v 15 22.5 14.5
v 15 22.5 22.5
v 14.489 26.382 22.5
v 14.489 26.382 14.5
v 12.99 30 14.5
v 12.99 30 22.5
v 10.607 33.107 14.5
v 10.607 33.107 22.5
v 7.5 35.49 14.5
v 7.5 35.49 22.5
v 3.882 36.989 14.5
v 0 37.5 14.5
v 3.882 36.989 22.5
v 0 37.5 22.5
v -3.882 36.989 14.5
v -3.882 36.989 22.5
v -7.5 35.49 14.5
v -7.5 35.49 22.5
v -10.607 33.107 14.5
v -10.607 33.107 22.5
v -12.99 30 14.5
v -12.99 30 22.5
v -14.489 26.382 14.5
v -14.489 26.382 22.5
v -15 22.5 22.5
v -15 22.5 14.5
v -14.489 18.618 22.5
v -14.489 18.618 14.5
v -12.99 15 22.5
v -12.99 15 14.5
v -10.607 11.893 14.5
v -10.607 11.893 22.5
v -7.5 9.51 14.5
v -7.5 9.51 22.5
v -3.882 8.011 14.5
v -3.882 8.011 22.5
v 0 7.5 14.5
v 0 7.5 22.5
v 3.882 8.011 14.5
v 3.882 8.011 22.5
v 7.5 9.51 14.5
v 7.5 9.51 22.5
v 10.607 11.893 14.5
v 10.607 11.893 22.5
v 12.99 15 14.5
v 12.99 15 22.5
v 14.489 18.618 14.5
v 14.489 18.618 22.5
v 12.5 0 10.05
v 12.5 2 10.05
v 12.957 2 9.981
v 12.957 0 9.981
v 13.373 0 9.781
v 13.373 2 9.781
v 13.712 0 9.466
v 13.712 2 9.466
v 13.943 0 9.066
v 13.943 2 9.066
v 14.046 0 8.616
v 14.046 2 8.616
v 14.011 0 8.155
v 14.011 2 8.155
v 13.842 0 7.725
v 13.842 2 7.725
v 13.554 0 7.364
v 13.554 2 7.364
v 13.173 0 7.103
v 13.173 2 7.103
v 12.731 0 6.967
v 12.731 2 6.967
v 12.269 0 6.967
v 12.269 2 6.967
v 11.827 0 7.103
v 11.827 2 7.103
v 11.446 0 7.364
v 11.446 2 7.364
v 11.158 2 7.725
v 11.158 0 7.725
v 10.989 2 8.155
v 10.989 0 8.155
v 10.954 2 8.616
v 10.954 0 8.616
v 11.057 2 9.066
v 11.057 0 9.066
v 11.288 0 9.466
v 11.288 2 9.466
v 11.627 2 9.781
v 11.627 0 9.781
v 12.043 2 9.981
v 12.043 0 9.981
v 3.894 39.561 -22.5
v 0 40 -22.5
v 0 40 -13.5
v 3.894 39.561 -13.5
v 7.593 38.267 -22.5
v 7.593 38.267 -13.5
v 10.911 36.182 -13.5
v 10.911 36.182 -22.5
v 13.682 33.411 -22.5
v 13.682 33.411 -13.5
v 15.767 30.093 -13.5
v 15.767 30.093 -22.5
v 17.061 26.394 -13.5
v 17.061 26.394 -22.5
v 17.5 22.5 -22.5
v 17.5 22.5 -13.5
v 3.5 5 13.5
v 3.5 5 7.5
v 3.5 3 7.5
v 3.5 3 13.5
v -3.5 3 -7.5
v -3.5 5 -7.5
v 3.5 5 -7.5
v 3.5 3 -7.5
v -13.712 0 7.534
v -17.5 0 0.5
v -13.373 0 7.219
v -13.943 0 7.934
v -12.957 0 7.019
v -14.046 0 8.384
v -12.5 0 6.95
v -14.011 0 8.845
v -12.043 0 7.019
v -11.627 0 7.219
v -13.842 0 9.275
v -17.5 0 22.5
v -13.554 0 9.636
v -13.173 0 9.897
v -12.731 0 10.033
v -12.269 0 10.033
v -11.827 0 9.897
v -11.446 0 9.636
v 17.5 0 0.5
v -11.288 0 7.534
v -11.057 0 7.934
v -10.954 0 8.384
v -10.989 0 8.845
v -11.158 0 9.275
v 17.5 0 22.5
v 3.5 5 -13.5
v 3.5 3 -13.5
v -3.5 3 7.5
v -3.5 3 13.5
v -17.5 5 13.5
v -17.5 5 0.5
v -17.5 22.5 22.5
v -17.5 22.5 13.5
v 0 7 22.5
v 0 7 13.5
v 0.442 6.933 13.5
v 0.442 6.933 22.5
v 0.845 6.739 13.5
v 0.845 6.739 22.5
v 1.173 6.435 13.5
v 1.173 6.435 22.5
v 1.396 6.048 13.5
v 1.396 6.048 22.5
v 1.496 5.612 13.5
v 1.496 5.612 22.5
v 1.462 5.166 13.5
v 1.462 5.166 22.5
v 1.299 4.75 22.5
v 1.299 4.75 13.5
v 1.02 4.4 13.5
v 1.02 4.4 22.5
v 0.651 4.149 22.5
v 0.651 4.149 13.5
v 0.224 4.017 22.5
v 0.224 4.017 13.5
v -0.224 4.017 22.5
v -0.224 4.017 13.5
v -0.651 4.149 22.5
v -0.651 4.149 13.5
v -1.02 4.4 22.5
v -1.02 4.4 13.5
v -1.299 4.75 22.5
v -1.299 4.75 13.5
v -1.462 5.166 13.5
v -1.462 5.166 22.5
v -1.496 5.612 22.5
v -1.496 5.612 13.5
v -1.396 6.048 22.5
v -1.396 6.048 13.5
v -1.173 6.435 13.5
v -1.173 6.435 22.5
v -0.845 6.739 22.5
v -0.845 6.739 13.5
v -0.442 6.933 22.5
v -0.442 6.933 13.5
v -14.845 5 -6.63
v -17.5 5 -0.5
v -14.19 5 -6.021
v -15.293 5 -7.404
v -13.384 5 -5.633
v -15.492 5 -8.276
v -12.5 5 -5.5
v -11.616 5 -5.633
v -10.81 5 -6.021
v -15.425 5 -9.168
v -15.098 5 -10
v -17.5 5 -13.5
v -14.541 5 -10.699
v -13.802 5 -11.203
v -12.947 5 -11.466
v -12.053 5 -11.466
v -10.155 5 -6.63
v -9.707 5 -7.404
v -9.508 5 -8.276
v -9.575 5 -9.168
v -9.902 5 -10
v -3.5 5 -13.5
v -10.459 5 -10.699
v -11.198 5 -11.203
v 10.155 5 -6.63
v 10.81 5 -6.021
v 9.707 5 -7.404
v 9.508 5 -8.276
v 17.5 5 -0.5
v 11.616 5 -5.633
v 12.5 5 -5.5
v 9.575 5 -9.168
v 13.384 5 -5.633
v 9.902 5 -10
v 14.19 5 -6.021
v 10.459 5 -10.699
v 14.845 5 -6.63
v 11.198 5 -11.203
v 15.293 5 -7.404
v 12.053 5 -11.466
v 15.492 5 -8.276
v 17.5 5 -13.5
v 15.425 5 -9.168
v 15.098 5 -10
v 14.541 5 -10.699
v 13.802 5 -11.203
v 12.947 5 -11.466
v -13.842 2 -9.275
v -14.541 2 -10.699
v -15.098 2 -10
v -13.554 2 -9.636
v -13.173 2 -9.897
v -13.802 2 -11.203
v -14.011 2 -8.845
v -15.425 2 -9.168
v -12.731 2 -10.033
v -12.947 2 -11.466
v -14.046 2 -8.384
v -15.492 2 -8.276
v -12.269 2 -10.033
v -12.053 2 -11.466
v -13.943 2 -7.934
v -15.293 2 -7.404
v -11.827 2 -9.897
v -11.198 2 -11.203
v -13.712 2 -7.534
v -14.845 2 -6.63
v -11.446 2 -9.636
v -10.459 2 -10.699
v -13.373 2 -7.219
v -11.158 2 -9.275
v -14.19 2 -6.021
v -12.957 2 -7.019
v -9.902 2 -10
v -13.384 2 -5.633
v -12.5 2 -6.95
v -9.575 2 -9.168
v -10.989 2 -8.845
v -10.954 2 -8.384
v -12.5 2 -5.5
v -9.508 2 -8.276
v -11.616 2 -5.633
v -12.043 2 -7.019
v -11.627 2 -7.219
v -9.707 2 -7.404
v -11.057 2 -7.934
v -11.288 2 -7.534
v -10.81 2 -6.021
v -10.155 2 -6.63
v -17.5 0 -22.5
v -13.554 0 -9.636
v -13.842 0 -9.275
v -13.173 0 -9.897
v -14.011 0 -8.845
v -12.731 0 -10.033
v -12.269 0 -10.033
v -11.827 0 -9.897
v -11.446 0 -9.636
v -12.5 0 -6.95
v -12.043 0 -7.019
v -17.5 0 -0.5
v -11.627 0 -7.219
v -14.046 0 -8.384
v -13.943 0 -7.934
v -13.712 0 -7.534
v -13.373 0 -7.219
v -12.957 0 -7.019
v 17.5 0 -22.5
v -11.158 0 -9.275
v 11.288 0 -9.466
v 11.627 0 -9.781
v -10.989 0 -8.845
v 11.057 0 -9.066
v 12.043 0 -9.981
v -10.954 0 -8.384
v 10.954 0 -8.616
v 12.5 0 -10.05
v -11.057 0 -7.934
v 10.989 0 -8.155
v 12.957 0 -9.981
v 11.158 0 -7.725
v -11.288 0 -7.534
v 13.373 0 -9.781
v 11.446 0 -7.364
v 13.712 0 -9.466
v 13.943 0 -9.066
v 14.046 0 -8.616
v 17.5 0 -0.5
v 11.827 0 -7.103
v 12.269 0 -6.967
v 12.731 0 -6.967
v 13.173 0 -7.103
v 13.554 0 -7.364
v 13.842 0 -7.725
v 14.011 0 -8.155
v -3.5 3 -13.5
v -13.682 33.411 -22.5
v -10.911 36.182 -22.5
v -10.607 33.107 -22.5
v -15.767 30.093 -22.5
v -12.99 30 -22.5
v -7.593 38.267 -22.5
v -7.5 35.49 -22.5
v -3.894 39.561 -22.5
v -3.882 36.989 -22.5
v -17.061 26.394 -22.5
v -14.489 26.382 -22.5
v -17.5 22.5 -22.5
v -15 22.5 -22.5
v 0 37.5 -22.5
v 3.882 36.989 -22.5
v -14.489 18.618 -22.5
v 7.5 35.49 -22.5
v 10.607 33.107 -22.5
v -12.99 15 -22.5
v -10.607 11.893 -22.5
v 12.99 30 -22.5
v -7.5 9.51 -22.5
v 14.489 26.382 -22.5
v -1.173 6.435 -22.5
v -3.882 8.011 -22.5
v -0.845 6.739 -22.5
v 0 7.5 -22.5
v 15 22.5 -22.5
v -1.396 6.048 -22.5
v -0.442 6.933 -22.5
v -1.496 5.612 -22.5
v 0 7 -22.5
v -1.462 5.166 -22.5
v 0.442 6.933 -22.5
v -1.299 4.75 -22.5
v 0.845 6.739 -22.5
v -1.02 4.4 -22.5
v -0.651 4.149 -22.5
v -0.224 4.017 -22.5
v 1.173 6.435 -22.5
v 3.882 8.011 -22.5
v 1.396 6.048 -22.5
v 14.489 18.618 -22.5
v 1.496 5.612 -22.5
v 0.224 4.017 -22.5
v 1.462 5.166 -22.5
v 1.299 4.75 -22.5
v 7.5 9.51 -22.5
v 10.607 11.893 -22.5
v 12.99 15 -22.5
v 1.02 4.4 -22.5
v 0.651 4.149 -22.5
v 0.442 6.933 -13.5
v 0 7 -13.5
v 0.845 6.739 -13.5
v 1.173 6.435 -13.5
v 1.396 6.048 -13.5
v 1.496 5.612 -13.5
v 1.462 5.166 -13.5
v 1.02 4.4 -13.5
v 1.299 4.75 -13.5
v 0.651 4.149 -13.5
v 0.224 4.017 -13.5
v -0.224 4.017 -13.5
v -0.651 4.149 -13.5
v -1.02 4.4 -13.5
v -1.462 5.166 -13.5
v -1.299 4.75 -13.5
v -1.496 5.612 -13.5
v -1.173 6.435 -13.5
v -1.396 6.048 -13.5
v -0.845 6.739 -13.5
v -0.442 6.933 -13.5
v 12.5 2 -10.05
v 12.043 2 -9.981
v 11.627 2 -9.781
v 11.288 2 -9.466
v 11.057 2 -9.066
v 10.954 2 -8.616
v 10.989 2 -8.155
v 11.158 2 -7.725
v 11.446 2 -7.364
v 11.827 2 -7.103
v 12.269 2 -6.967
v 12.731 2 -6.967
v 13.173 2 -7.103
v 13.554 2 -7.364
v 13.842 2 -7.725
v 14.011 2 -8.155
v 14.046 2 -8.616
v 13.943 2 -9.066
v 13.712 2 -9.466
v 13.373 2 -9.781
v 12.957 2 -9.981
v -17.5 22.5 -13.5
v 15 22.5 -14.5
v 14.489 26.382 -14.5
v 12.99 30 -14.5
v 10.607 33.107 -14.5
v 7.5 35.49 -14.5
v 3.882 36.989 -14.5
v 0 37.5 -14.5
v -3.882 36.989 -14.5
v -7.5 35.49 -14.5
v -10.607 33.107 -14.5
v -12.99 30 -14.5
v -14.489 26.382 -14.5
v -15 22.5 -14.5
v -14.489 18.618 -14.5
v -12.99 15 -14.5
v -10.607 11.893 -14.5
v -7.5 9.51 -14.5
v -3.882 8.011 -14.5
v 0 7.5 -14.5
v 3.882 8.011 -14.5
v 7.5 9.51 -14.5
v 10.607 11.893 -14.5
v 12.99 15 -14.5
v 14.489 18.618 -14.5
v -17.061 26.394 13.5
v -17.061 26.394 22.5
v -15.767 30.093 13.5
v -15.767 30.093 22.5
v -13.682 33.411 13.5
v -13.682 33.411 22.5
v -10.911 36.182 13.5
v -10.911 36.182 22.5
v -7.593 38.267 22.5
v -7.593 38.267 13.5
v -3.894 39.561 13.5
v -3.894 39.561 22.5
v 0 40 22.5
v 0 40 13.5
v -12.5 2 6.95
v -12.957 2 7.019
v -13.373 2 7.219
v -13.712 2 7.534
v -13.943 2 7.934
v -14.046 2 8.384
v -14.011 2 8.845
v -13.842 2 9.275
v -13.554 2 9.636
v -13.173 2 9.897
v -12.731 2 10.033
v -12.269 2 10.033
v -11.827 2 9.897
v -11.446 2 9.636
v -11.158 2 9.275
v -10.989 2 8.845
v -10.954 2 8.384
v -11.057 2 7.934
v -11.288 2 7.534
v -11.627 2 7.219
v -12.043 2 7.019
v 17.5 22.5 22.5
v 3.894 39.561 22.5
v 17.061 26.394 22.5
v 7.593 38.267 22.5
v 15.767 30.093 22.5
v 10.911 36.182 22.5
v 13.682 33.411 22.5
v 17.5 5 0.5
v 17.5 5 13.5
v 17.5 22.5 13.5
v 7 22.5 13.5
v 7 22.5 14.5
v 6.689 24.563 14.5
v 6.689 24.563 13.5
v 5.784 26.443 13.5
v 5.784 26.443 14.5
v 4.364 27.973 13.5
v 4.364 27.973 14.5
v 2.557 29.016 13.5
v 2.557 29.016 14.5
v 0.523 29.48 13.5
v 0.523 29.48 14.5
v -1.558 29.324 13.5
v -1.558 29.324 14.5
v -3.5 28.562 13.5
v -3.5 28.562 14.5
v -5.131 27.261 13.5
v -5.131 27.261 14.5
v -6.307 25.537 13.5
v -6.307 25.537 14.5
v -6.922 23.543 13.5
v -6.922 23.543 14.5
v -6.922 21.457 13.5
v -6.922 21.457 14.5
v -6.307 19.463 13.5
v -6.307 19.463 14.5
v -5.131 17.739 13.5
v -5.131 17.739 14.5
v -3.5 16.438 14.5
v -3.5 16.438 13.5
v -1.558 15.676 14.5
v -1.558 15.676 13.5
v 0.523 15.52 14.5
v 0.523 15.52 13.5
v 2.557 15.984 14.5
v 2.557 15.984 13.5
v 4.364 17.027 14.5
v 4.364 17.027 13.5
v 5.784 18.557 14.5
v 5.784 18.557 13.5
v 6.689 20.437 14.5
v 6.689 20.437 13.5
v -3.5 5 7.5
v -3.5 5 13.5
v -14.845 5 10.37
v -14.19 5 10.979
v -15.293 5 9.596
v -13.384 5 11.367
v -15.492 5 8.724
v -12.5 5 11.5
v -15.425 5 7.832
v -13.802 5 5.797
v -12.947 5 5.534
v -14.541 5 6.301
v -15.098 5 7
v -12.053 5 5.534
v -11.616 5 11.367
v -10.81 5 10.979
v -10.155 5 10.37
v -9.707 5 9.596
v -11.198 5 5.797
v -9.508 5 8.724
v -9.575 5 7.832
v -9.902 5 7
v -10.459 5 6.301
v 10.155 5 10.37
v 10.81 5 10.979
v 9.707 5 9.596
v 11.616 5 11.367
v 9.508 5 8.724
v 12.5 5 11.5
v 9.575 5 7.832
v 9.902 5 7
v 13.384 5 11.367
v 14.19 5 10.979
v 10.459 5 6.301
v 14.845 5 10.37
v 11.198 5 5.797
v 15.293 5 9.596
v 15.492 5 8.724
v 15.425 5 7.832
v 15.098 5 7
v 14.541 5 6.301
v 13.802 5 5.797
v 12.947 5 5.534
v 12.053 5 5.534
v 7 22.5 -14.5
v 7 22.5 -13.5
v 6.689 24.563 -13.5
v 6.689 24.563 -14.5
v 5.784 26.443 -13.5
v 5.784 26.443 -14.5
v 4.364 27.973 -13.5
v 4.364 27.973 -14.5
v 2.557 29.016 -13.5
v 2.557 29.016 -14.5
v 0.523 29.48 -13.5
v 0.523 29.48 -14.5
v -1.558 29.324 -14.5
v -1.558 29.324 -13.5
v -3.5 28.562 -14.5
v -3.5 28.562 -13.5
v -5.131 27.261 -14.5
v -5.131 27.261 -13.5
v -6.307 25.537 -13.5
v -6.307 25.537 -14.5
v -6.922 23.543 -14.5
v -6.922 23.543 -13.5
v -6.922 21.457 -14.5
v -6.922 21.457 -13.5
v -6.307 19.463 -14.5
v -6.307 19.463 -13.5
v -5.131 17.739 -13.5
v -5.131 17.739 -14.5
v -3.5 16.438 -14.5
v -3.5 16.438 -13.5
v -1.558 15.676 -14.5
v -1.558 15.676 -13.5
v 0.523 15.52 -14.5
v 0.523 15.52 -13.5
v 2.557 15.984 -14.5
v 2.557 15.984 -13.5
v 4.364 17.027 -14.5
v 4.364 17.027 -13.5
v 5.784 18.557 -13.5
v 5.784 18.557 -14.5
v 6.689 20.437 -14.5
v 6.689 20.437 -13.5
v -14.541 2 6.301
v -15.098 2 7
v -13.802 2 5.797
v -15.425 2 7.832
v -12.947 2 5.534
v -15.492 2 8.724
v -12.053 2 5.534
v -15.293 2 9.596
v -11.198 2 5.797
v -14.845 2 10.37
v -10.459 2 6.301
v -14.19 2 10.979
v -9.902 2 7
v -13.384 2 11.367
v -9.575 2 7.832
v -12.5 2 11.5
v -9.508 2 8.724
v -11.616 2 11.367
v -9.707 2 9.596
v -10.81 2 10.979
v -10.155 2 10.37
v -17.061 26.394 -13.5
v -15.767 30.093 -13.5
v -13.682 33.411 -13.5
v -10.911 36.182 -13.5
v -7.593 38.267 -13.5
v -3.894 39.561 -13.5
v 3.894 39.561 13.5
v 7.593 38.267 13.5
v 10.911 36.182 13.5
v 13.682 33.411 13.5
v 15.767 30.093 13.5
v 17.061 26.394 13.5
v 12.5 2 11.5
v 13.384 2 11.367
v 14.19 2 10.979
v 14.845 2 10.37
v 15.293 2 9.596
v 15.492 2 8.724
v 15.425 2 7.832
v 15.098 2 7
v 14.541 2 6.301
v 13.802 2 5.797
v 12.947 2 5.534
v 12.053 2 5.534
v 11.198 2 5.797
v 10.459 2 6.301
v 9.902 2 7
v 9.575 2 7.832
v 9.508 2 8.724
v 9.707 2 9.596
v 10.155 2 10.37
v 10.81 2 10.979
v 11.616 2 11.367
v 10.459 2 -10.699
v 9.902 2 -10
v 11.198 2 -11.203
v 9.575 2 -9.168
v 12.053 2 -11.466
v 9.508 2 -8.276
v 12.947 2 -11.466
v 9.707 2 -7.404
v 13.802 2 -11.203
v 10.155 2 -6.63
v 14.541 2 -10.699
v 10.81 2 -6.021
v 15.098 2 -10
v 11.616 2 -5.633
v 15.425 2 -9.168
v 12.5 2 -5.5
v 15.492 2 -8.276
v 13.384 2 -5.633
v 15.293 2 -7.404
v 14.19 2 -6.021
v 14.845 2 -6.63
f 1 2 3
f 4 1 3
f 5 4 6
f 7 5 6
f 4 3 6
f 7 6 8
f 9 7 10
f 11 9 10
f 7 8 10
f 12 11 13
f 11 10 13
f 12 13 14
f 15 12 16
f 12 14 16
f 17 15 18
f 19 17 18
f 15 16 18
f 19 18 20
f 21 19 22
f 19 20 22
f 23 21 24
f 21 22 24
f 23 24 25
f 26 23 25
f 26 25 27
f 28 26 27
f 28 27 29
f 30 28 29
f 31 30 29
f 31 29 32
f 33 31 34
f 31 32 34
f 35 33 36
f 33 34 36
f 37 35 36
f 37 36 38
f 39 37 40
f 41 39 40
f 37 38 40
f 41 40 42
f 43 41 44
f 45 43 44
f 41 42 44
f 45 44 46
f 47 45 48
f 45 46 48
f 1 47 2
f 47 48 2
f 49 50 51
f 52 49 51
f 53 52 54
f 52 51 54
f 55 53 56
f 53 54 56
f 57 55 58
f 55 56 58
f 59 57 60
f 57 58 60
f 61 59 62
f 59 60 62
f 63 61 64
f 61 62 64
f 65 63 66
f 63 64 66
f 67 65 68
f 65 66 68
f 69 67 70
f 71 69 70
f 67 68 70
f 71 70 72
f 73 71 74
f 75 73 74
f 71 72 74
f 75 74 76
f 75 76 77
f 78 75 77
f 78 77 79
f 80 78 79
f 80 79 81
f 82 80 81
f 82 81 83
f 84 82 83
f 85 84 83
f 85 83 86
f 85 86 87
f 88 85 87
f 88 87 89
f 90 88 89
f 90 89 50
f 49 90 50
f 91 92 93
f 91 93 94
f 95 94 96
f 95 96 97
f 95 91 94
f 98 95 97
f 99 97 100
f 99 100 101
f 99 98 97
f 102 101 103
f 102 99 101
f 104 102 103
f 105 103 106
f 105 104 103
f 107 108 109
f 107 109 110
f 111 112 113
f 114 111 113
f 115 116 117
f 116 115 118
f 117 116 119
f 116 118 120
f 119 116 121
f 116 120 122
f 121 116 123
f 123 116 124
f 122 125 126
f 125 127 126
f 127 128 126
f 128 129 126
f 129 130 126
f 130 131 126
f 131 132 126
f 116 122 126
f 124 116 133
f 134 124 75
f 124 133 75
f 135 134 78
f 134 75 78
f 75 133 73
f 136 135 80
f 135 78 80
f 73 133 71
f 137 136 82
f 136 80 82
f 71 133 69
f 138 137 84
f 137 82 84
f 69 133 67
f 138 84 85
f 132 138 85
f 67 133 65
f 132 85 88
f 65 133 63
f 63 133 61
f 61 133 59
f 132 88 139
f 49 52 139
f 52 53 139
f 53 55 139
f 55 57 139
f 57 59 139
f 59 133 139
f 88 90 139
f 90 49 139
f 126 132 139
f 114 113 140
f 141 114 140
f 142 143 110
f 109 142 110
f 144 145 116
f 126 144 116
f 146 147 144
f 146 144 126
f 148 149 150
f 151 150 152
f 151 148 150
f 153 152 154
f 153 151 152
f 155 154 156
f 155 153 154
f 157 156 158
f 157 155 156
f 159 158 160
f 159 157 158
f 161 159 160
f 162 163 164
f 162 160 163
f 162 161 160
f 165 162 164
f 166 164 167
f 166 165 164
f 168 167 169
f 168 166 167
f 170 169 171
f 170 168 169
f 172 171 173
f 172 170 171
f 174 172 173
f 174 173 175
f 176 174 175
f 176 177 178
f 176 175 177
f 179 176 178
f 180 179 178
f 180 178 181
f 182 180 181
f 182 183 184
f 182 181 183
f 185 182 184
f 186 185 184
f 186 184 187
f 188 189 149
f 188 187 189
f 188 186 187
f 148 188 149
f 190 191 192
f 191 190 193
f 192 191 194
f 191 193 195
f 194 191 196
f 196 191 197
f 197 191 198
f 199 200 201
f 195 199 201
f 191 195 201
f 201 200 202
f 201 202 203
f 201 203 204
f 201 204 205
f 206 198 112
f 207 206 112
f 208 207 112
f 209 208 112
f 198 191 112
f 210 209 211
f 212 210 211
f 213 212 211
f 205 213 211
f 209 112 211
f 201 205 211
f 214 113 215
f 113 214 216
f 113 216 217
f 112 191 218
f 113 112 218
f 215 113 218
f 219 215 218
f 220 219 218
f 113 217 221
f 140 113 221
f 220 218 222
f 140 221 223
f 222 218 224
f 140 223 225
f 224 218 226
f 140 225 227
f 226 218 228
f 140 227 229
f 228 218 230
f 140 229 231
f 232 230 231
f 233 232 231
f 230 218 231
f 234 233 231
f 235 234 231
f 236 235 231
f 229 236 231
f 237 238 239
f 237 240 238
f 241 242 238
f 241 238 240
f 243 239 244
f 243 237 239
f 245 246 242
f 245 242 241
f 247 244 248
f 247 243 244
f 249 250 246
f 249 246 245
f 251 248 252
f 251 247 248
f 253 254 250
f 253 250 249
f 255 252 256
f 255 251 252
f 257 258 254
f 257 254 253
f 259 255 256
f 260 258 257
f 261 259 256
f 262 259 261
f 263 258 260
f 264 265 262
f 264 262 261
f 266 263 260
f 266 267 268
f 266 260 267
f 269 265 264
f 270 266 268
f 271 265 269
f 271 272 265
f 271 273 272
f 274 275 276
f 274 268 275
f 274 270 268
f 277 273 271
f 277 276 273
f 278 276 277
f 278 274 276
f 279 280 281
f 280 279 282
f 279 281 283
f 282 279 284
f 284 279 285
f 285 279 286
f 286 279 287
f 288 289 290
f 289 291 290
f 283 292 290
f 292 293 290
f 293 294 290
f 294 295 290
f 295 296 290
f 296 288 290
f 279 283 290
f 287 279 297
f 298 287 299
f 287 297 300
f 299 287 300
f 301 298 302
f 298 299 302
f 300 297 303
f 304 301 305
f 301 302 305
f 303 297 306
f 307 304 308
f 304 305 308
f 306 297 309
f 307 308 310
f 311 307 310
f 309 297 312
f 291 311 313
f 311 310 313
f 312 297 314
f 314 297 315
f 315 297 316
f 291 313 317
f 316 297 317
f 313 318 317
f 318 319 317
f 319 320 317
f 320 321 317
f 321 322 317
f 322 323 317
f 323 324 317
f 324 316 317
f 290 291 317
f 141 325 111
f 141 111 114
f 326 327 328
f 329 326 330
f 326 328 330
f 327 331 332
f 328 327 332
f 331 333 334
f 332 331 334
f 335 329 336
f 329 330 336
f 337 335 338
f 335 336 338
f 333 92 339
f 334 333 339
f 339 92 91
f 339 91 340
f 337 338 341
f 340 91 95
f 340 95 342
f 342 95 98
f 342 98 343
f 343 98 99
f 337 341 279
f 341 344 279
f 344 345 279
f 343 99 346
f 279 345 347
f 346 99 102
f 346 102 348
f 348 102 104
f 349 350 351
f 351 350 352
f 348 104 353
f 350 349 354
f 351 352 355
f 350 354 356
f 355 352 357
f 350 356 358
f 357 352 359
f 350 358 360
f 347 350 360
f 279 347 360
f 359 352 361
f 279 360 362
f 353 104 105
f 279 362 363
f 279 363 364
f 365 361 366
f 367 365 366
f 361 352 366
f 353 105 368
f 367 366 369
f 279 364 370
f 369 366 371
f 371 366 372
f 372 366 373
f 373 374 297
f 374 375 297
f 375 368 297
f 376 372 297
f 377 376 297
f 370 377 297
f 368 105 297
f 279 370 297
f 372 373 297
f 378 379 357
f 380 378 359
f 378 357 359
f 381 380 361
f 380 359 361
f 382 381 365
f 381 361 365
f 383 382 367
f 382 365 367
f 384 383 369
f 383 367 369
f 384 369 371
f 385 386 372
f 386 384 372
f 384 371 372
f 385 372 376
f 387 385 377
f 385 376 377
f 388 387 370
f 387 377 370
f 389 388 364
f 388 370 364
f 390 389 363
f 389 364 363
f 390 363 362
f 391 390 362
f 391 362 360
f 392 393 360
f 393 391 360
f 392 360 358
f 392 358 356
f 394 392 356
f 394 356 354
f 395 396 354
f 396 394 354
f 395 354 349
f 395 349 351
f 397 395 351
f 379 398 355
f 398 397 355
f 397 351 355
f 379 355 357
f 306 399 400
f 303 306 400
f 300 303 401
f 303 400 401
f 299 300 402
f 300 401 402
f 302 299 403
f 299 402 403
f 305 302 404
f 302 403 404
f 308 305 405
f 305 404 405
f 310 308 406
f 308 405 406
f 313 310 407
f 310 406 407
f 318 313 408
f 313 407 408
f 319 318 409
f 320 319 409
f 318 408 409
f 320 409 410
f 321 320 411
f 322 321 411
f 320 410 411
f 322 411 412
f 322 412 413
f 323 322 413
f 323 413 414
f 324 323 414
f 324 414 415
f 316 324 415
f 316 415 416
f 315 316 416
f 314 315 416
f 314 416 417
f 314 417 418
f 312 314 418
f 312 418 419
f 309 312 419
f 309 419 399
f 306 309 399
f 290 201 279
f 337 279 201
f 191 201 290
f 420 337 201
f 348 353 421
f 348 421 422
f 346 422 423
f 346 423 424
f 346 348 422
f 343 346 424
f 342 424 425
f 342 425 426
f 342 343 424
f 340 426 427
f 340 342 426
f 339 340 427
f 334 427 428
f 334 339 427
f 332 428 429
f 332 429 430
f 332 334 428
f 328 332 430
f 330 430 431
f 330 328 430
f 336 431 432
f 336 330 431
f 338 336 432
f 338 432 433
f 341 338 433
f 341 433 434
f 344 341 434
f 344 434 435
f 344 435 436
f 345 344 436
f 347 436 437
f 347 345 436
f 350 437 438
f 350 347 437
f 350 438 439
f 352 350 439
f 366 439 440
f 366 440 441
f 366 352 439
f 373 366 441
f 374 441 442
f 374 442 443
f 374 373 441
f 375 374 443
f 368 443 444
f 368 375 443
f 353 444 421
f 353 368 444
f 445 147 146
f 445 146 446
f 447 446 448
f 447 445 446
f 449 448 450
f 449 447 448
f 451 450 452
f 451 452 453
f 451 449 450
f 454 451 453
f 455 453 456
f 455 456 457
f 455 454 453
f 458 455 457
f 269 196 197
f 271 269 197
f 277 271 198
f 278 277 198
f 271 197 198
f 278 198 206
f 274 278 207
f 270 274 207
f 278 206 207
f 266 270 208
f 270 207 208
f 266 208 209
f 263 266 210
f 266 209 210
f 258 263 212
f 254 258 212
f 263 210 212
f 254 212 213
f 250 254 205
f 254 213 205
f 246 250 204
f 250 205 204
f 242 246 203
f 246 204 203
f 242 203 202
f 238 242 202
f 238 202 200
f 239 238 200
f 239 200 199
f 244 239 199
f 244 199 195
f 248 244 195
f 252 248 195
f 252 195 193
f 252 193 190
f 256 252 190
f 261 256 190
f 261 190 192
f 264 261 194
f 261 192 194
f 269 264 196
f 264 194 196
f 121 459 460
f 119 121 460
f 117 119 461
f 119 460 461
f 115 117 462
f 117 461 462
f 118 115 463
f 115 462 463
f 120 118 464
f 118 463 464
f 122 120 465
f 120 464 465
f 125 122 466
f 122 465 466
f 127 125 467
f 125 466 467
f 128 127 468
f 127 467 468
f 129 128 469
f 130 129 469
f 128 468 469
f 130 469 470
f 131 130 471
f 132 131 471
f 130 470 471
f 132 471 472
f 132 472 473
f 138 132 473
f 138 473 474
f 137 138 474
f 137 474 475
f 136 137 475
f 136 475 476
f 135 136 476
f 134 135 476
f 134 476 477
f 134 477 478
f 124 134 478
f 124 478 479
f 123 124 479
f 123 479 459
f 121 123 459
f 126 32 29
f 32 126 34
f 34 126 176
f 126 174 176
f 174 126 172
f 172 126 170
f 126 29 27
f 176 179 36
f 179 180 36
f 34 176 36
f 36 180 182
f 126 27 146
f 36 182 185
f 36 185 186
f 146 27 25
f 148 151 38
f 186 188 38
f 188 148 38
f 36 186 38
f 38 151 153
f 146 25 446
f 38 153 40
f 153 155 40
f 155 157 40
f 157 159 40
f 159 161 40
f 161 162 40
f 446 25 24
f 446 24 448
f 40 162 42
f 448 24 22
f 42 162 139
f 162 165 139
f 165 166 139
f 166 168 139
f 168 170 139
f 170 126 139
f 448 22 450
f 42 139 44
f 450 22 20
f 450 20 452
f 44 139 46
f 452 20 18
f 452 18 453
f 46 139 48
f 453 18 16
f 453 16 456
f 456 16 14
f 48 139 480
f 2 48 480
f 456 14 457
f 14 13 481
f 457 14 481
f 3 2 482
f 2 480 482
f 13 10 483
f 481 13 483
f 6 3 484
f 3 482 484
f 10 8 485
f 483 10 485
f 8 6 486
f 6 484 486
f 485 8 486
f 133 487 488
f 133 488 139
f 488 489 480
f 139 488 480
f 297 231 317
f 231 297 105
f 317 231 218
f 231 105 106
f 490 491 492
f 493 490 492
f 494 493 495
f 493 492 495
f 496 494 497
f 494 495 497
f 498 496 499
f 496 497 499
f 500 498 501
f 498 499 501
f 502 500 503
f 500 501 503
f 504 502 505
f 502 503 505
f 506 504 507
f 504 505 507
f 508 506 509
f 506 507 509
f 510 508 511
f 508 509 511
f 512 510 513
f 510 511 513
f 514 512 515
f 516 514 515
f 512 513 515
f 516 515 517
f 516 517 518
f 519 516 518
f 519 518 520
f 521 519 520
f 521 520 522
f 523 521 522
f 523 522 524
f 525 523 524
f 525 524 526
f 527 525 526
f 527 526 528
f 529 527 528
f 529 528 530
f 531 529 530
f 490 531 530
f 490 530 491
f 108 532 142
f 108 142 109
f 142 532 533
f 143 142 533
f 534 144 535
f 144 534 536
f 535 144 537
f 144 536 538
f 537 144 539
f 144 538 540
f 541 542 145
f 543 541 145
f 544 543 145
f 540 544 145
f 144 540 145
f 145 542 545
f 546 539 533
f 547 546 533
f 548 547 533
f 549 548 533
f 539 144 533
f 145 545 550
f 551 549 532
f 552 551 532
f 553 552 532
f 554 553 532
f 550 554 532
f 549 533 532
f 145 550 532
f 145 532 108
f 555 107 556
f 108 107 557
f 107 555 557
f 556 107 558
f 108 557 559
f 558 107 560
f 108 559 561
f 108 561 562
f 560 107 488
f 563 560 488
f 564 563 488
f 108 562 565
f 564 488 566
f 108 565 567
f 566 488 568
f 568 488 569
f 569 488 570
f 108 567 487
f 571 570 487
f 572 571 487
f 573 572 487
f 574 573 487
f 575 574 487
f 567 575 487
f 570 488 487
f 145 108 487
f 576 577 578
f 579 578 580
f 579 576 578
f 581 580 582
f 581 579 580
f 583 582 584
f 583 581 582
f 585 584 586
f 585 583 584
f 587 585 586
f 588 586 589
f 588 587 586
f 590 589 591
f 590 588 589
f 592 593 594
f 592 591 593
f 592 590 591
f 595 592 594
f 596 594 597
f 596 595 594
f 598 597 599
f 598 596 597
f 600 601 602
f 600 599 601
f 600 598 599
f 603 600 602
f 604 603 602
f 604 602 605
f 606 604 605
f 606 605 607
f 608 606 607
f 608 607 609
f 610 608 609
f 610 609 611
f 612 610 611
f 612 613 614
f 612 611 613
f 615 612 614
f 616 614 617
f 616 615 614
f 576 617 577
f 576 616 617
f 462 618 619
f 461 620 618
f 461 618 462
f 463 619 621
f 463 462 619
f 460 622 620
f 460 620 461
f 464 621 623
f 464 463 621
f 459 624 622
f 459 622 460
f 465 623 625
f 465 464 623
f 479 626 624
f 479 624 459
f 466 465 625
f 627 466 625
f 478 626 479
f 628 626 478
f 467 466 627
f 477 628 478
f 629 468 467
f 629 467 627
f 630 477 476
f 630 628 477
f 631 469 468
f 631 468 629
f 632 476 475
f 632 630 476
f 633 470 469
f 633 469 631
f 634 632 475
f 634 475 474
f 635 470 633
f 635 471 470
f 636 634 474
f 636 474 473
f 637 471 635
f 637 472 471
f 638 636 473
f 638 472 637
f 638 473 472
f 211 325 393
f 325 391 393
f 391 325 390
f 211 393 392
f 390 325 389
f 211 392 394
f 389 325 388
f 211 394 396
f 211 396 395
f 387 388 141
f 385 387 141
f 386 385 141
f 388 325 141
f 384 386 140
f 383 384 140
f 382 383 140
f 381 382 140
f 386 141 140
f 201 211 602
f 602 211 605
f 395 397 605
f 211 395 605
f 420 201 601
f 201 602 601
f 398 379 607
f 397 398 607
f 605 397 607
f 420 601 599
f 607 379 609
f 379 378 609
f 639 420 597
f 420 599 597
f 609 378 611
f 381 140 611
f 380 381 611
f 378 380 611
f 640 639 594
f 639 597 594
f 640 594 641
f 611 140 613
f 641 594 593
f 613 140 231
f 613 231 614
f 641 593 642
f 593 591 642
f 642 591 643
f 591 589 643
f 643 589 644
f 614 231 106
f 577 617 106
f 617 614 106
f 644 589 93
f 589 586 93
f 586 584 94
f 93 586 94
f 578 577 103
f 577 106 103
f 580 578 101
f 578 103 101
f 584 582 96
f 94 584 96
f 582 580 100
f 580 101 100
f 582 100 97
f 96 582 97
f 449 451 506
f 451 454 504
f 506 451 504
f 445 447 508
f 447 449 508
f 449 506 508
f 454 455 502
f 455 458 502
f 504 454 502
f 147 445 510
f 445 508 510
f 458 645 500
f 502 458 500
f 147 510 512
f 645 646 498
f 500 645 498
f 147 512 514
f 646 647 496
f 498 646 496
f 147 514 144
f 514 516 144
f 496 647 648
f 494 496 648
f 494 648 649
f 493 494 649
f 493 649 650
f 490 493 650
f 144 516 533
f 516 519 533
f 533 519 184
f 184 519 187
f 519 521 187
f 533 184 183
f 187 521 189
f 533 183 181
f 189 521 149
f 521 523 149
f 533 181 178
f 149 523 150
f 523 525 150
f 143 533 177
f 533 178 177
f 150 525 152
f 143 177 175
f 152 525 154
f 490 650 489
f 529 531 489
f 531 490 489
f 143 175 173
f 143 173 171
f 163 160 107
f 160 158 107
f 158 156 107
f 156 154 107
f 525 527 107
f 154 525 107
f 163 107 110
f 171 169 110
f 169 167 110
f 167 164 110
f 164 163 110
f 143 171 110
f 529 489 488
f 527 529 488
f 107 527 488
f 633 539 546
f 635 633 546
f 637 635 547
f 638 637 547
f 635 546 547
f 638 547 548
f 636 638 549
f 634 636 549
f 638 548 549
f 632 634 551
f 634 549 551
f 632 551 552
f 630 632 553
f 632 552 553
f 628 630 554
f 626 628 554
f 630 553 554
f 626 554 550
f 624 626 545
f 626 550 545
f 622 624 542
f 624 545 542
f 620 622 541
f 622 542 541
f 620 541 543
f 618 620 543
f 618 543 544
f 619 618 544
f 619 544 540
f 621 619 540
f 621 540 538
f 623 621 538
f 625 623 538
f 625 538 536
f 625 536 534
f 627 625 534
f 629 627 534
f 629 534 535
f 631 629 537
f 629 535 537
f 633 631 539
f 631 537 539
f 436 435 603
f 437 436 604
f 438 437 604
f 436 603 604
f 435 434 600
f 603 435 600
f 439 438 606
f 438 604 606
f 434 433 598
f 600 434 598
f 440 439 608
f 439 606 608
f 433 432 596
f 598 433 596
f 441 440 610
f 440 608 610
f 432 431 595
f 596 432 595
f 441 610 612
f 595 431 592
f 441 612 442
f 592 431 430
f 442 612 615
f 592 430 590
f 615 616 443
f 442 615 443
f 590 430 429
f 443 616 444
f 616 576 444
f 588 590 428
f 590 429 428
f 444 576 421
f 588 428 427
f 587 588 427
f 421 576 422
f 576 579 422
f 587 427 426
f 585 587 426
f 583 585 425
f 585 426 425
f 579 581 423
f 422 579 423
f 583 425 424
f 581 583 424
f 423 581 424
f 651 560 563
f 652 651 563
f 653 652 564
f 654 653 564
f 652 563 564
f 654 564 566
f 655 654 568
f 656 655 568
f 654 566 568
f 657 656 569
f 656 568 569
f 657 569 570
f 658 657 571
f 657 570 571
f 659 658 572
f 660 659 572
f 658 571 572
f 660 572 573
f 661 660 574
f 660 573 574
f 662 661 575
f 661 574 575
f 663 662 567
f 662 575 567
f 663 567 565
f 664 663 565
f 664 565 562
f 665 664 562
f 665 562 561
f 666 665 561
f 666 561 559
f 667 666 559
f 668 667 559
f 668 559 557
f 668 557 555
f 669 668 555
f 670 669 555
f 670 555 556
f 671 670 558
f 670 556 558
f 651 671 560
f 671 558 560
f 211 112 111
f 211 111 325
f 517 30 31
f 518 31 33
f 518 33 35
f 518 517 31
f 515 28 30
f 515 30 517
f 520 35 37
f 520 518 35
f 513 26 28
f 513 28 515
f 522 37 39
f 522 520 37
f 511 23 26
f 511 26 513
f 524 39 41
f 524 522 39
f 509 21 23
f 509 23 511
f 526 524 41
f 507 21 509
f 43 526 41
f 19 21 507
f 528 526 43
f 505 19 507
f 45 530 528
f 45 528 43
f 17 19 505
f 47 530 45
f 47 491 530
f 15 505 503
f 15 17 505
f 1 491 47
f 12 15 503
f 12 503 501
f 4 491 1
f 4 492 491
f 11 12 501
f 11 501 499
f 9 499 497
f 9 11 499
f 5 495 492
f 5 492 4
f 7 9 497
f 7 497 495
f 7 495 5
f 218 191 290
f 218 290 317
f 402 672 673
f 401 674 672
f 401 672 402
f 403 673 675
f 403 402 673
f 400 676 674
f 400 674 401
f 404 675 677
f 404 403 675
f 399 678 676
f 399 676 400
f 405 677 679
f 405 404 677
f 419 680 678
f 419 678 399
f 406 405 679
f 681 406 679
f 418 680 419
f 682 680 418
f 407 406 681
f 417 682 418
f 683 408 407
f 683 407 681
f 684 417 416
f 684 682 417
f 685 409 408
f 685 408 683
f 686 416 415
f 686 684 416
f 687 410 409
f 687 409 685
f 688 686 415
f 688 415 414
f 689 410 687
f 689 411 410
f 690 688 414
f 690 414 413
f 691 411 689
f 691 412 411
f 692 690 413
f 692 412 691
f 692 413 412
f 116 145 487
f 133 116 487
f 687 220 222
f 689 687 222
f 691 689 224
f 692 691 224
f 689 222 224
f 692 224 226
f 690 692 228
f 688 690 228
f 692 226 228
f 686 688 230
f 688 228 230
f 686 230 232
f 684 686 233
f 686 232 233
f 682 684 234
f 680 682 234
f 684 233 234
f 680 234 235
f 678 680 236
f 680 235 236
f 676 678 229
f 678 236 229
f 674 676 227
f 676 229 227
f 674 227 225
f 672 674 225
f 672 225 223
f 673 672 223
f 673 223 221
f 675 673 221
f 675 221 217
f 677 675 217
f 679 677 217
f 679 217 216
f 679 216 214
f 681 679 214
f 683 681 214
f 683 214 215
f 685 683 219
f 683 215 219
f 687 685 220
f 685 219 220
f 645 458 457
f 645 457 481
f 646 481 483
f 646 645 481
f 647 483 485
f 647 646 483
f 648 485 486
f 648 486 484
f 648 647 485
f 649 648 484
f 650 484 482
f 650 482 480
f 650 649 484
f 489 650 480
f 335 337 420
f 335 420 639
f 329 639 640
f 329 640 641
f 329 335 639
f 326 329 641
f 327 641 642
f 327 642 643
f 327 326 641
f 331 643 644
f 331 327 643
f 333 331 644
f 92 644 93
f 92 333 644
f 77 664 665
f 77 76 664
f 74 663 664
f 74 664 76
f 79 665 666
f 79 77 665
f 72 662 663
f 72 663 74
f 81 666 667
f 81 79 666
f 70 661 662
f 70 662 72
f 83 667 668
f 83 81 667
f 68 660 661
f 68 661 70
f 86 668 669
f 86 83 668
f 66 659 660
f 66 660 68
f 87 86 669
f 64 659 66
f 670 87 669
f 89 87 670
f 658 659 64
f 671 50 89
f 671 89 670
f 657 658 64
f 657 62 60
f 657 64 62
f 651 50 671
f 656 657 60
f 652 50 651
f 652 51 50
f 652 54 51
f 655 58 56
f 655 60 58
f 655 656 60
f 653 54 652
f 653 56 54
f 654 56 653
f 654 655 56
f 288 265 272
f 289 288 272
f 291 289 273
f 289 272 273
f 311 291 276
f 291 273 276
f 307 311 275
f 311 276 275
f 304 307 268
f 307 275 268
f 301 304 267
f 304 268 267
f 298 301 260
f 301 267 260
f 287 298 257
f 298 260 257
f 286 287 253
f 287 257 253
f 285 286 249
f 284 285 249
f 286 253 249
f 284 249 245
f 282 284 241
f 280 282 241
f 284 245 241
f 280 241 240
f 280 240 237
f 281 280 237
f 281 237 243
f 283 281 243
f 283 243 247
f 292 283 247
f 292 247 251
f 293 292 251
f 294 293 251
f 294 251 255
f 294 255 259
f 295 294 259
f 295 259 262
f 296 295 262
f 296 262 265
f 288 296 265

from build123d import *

# Parameters (mm, degrees)
EXTRUDE_1_DEPTH          = 17.5
CUT_EXTRUDE_1_DEPTH      = 63.69968102
CUT_EXTRUDE_1_DEPTH_BACK = 63.69968102
SKETCH_6_R               = 1.55
CUT_EXTRUDE_4_DEPTH      = 46.138675213
SKETCH_7_R               = 15
CUT_EXTRUDE_5_DEPTH      = 8
SKETCH_8_R               = 7
CUT_EXTRUDE_6_DEPTH      = 2
SKETCH_9_R               = 1.5
CUT_EXTRUDE_7_DEPTH      = 14
SKETCH_10_W              = 7
SKETCH_10_H              = 6
CUT_EXTRUDE_8_DEPTH      = 2
SKETCH_15_W              = 35
SKETCH_15_H              = 1
CUT_EXTRUDE_9_DEPTH      = 10
SKETCH_16_R              = 3
CUT_EXTRUDE_10_DEPTH     = 3


with BuildPart() as part:
    # 草图1 → 凸台-拉伸1 (new, symmetric)
    with BuildSketch(Plane(origin=(0, 0, 0), x_dir=(0, 0, -1), z_dir=(1, 0, 0))):
        Polygon((22.5, 0), (-22.5, 0), (-22.5, 40), (-13.5, 40), (-13.5, 5), (13.5, 5), (13.5, 40), (22.5, 40), align=None)
    extrude(amount=EXTRUDE_1_DEPTH, both=True)

    # 草图2 → 切除-拉伸1 (cut, two sides: drawn at the far end of the back side and taken through both)
    with BuildSketch(Plane.XY.offset(22.5).offset(-CUT_EXTRUDE_1_DEPTH_BACK)):
        with BuildLine():
            ThreePointArc((-17.5, 22.5), (-12.374368671, 34.874368671), (0, 40))
            Line((0, 40), (-17.5, 40))
            Line((-17.5, 40), (-17.5, 22.5))
        make_face()
        with BuildLine():
            Line((17.5, 22.5), (17.5, 40))
            Line((17.5, 40), (0, 40))
            ThreePointArc((0, 40), (12.374368671, 34.874368671), (17.5, 22.5))
        make_face()
    extrude(amount=CUT_EXTRUDE_1_DEPTH + CUT_EXTRUDE_1_DEPTH_BACK, mode=Mode.SUBTRACT)

    # 草图6 → 切除-拉伸4 (cut, through all)
    with BuildSketch(Plane(origin=(0, 5, 0), x_dir=(1, 0, 0), z_dir=(0, 1, 0))):
        with Locations(Location((-12.5, 8.5, 0), (0, 0, 270))):
            Circle(SKETCH_6_R)
        with Locations(Location((12.5, 8.5, 0), (0, 0, 90))):
            Circle(SKETCH_6_R)
        with Locations(Location((12.5, -8.5, 0), (0, 0, 270))):
            Circle(SKETCH_6_R)
        with Locations(Location((-12.5, -8.5, 0), (0, 0, 90))):
            Circle(SKETCH_6_R)
    extrude(amount=-CUT_EXTRUDE_4_DEPTH, mode=Mode.SUBTRACT)

    # 草图7 → 切除-拉伸5 (cut)
    with BuildSketch(Plane.XY.offset(22.5)):
        with Locations((0, 22.5)):
            Circle(SKETCH_7_R)
    cut_extrude_5 = extrude(amount=-CUT_EXTRUDE_5_DEPTH, mode=Mode.SUBTRACT)

    # 草图8 → 切除-拉伸6 (cut)
    with BuildSketch(Plane.XY.offset(14.5)):
        with Locations((0, 22.5)):
            Circle(SKETCH_8_R)
    cut_extrude_6 = extrude(amount=-CUT_EXTRUDE_6_DEPTH, mode=Mode.SUBTRACT)

    # 镜向1: 切除-拉伸5, 切除-拉伸6 across plane
    add(cut_extrude_5.mirror(Plane.XY), mode=Mode.SUBTRACT)
    add(cut_extrude_6.mirror(Plane.XY), mode=Mode.SUBTRACT)

    # 草图9 → 切除-拉伸7 (cut)
    with BuildSketch(Plane(origin=(0, 0, -22.5), x_dir=(-1, 0, 0), z_dir=(0, 0, -1))):
        with Locations(Location((0, 5.5, 0), (0, 0, 90))):
            Circle(SKETCH_9_R)
    cut_extrude_7 = extrude(amount=-CUT_EXTRUDE_7_DEPTH, mode=Mode.SUBTRACT)

    # 草图10 → 切除-拉伸8 (cut)
    with BuildSketch(Plane(origin=(0, 5, 0), x_dir=(1, 0, 0), z_dir=(0, 1, 0))):
        with Locations((0, 10.5)):
            Rectangle(SKETCH_10_W, SKETCH_10_H)
    cut_extrude_8 = extrude(amount=-CUT_EXTRUDE_8_DEPTH, mode=Mode.SUBTRACT)

    # 镜向2: 切除-拉伸7, 切除-拉伸8 across plane
    add(cut_extrude_7.mirror(Plane.XY), mode=Mode.SUBTRACT)
    add(cut_extrude_8.mirror(Plane.XY), mode=Mode.SUBTRACT)

    # 草图15 → 切除-拉伸9 (cut)
    with BuildSketch(Plane(origin=(0, 5, 0), x_dir=(1, 0, 0), z_dir=(0, 1, 0))):
        Rectangle(SKETCH_15_W, SKETCH_15_H)
    extrude(amount=-CUT_EXTRUDE_9_DEPTH, mode=Mode.SUBTRACT)


with BuildPart() as cut_extrude_9_piece_1:
    # of the separate pieces the step leaves, piece 1, a body of its own (cut_extrude_9_pieces)
    add(part.part.solids().sort_by_distance((-17.5, 0, -22.5))[0])


with BuildPart() as cut_extrude_9_piece_2:
    # of the separate pieces the step leaves, piece 2, a body of its own (cut_extrude_9_pieces)
    add(part.part.solids().sort_by_distance((17.5, 0, 0.5))[0])


with BuildPart() as cut_extrude_10_tool:
    # 草图16 → 切除-拉伸10 (new body)
    with BuildSketch(Plane(origin=(0, 5, 0), x_dir=(1, 0, 0), z_dir=(0, 1, 0))):
        with Locations(Location((-12.5, 8.5, 0), (0, 0, 270))):
            Circle(SKETCH_16_R)
        with Locations(Location((12.5, 8.5, 0), (0, 0, 270))):
            Circle(SKETCH_16_R)
        with Locations(Location((12.5, -8.5, 0), (0, 0, 270))):
            Circle(SKETCH_16_R)
        with Locations(Location((-12.5, -8.5, 0), (0, 0, 270))):
            Circle(SKETCH_16_R)
    extrude(amount=-CUT_EXTRUDE_10_DEPTH)


with BuildPart() as cut_extrude_9_piece_1_1:
    add(cut_extrude_9_piece_1.part)

    # 切除-拉伸10: cut by cut_extrude_10_tool
    add(cut_extrude_10_tool.part, mode=Mode.SUBTRACT)


with BuildPart() as cut_extrude_9_piece_2_1:
    add(cut_extrude_9_piece_2.part)

    # 切除-拉伸10: cut by cut_extrude_10_tool
    add(cut_extrude_10_tool.part, mode=Mode.SUBTRACT)


solid = Compound([cut_extrude_9_piece_1_1.part, cut_extrude_9_piece_2_1.part])
